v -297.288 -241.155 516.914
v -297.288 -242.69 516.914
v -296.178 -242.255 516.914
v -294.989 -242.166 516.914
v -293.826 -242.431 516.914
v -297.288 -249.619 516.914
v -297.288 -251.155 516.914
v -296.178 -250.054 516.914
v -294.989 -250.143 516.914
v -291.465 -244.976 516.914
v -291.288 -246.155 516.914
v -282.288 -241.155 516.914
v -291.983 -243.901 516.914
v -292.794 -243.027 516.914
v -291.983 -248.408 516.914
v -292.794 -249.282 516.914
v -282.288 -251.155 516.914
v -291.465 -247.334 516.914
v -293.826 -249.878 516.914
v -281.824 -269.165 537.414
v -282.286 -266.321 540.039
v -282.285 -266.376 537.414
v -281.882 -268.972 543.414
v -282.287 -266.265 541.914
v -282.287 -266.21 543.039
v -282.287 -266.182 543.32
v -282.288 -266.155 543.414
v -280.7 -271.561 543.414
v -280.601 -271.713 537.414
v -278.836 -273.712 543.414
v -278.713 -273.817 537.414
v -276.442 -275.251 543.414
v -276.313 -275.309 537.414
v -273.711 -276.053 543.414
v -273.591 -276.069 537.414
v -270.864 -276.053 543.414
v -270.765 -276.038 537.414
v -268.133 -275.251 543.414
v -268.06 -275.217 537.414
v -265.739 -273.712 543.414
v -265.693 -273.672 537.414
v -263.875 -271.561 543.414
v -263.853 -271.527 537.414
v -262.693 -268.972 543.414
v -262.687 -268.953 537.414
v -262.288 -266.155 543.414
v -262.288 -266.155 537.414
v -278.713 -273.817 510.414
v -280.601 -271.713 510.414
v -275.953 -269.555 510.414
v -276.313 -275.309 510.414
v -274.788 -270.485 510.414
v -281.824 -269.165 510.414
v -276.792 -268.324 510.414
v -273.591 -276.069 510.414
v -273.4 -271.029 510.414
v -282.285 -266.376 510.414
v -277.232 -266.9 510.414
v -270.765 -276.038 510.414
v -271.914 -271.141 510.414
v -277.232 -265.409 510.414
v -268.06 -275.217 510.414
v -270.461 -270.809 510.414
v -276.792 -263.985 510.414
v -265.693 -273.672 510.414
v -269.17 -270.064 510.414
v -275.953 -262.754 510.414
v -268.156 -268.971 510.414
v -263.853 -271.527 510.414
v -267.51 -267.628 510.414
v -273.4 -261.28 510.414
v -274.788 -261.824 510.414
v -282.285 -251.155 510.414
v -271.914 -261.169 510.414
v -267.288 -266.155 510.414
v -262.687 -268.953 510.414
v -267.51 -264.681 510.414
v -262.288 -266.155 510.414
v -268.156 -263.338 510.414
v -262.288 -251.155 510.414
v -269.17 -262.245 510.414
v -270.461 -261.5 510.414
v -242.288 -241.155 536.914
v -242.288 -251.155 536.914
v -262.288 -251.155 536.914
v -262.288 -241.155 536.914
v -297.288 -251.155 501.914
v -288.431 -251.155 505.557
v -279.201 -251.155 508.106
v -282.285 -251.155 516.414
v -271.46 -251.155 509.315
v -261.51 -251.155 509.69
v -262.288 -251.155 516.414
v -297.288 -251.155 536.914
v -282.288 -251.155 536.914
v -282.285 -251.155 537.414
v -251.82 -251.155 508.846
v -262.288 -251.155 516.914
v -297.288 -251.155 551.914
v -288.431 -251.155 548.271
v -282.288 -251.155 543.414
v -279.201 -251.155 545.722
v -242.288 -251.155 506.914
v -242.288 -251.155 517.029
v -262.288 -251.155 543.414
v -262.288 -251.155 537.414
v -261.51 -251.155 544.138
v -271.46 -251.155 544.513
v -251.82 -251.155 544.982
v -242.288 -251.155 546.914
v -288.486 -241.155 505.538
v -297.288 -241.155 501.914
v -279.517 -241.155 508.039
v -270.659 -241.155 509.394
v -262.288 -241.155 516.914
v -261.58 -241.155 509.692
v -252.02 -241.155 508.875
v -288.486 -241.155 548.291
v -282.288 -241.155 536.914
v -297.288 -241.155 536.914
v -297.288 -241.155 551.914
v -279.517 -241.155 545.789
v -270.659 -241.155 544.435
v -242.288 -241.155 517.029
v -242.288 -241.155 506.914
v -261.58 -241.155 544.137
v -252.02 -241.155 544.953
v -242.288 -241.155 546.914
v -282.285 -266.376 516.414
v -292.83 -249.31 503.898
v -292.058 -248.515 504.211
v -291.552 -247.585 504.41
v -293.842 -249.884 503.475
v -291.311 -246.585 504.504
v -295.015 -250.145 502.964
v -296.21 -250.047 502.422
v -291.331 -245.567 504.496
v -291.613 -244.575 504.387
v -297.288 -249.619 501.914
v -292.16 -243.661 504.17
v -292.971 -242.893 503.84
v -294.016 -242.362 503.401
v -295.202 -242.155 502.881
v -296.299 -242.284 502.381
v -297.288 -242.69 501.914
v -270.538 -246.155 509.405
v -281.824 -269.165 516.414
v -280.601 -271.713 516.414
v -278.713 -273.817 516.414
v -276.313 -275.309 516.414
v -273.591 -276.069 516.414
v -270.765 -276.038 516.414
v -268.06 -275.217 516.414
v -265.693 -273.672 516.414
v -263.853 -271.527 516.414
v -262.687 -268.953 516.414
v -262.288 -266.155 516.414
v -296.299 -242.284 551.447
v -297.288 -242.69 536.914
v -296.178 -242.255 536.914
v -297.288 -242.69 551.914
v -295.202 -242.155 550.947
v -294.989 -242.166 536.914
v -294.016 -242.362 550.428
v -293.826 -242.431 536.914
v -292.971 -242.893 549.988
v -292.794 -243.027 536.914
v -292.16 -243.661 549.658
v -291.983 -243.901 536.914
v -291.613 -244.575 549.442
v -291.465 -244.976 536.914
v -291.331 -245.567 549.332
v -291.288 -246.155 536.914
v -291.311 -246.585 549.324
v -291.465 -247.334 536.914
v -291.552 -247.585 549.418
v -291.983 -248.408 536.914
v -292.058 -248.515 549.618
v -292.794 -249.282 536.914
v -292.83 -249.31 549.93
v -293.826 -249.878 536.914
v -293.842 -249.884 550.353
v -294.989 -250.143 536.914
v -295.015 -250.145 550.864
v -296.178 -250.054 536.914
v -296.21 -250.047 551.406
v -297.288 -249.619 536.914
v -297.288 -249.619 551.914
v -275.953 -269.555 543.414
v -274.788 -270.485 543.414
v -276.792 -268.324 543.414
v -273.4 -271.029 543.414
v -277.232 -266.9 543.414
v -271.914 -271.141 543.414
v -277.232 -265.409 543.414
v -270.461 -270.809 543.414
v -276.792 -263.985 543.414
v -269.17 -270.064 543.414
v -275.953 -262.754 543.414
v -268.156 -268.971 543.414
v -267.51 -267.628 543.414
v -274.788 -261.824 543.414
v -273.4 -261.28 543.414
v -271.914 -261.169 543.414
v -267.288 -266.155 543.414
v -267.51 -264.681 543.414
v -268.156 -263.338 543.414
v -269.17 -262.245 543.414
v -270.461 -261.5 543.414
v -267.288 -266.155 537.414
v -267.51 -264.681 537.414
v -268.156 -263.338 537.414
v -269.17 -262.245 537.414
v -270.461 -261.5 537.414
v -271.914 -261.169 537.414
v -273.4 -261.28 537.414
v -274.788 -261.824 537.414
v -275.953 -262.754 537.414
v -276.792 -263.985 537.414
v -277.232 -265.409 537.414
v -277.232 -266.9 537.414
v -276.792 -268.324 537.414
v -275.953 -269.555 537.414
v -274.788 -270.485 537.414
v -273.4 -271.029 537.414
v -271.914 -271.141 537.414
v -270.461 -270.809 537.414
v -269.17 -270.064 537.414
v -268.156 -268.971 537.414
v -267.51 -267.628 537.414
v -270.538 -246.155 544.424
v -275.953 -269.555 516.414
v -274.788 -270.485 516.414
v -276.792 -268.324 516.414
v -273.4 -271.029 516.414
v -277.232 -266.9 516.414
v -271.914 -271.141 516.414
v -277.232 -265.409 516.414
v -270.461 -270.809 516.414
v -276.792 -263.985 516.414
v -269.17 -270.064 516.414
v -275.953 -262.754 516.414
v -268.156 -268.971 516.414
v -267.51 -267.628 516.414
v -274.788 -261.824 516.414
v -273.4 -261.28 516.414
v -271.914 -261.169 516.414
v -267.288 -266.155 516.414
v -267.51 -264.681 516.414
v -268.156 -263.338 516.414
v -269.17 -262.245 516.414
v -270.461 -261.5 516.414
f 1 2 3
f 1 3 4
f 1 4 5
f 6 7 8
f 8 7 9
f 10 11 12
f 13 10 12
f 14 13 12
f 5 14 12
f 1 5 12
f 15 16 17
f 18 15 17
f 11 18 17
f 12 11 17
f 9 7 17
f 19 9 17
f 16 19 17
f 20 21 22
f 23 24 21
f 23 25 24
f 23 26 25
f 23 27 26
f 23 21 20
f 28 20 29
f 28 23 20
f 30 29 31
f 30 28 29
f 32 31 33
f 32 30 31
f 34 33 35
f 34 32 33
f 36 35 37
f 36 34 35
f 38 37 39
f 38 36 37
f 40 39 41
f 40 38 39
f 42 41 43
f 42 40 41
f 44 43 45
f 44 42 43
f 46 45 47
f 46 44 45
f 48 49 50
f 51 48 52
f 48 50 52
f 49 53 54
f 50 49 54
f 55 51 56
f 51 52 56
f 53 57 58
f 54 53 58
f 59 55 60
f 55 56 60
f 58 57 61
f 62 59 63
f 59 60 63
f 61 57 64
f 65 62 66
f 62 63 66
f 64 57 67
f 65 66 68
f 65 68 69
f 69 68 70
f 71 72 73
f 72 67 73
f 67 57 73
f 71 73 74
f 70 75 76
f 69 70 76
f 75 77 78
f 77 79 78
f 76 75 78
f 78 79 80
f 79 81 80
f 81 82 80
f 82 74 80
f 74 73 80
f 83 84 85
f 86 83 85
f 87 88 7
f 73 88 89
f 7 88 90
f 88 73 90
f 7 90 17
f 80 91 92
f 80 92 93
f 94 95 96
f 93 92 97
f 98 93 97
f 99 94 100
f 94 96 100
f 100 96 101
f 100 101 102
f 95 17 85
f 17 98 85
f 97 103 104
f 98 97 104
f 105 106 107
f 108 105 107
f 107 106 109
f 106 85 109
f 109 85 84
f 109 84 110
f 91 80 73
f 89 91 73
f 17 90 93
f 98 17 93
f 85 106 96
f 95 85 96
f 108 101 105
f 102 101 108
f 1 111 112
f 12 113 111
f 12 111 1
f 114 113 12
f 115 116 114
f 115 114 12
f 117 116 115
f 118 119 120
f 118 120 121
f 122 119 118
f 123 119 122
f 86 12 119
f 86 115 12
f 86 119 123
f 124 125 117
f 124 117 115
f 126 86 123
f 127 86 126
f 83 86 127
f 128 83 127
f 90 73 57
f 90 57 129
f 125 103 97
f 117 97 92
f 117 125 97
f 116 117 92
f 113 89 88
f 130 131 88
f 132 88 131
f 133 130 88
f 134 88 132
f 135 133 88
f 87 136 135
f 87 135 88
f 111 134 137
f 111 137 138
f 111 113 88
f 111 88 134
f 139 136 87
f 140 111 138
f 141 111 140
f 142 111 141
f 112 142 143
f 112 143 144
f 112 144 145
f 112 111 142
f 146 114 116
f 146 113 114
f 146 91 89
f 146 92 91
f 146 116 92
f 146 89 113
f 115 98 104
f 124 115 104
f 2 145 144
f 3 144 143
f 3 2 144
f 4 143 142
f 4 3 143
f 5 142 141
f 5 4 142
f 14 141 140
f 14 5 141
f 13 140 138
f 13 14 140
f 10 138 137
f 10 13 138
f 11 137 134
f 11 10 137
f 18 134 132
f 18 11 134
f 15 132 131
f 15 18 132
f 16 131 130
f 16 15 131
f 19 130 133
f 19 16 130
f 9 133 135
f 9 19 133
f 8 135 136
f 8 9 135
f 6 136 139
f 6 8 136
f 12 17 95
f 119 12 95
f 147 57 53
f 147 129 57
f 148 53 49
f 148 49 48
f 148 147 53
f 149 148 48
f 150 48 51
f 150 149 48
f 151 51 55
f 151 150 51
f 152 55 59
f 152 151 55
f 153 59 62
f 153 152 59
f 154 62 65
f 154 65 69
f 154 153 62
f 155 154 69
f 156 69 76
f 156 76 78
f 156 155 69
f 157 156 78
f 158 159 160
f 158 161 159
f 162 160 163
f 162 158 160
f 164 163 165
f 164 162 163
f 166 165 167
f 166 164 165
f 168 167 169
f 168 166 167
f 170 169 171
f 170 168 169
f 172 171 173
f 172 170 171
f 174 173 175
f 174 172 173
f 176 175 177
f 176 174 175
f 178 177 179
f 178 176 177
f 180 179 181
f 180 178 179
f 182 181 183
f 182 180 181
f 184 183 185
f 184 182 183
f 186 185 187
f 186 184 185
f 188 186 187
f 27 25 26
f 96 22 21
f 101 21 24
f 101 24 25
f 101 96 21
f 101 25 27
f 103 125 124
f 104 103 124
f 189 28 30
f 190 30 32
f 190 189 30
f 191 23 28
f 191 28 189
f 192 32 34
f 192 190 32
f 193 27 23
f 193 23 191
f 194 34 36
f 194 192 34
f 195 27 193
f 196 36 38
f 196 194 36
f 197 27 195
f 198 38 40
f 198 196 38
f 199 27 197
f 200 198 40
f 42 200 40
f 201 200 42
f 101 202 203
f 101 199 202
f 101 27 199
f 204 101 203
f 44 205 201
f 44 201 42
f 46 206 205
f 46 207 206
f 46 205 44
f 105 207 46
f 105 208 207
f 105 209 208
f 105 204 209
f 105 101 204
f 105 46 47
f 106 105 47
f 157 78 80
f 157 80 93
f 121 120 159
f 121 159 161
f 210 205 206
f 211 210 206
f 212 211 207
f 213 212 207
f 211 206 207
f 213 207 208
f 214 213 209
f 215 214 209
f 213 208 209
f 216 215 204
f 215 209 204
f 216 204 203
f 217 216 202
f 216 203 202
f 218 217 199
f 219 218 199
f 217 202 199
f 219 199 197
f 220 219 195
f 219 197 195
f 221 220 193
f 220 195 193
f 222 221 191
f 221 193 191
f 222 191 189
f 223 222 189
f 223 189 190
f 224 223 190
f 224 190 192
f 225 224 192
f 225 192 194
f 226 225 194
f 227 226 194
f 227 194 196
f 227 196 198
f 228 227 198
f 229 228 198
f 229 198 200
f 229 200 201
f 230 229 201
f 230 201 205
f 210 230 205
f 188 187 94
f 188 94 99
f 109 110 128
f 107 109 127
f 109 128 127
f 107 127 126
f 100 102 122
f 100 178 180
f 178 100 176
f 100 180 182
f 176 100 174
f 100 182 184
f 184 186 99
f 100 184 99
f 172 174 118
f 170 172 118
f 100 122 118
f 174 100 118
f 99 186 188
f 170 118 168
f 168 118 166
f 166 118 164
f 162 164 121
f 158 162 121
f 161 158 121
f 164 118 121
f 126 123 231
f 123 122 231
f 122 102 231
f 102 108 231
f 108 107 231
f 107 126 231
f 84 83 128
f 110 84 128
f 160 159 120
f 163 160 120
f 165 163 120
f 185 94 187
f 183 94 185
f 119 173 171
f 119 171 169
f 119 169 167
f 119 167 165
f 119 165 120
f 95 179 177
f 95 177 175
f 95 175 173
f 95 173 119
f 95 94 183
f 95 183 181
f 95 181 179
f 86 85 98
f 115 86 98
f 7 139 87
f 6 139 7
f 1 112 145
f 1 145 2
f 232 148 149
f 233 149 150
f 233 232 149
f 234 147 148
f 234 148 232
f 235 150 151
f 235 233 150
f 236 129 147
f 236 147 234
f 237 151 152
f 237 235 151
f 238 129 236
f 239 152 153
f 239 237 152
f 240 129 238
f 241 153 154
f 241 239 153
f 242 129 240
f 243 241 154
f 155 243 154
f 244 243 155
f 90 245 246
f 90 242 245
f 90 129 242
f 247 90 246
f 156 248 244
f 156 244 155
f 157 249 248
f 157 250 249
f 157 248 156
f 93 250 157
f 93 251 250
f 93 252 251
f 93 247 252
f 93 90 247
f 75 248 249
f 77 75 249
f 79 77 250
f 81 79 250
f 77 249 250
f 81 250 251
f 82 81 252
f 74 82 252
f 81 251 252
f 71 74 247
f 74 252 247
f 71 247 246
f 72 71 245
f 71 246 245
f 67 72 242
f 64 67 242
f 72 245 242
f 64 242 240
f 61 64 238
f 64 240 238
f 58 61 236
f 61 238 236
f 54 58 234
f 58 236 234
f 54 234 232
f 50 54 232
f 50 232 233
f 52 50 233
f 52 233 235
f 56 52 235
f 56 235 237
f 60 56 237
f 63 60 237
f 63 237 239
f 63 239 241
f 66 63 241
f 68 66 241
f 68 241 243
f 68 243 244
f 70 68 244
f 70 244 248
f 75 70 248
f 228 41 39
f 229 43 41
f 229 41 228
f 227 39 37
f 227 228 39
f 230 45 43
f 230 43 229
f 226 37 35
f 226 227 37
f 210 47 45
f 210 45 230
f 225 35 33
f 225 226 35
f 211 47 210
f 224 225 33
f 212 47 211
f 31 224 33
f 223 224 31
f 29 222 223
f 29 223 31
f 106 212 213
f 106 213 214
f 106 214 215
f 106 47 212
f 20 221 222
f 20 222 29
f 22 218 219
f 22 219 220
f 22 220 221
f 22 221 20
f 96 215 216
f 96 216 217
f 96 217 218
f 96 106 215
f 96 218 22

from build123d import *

# Parameters (mm, degrees)
SKETCH_1_W               = 77
SKETCH_1_H               = 10
EXTRUDE_1_DEPTH          = 55
CUT_EXTRUDE_1_DEPTH      = 639.884201719
SKETCH_4_W               = 15
SKETCH_4_H               = 20
CUT_EXTRUDE_3_DEPTH      = 10
SKETCH_5_W               = 19.997544879
SKETCH_5_H               = 6
EXTRUDE_2_DEPTH          = 26
SKETCH_8_R               = 5
CUT_EXTRUDE_4_DEPTH      = 409.554479516
CUT_EXTRUDE_5_DEPTH      = 407.529462179
CUT_EXTRUDE_5_DEPTH_BACK = 407.529462179
SKETCH_10_R              = 4


with BuildPart() as part:
    # 草图1 → 凸台-拉伸1 (new body)
    with BuildSketch(Plane.ZY.offset(242.287512766)):
        with Locations((526.914147293, -246.15455511)):
            Rectangle(SKETCH_1_W, SKETCH_1_H)
    extrude(amount=EXTRUDE_1_DEPTH)

    # 草图2 → 切除-拉伸1 (cut, through all)
    with BuildSketch(Plane(origin=(0, -241.15455511, 0), x_dir=(1, 0, 0), z_dir=(0, 1, 0))):
        with BuildLine():
            Line((-242.287512766, -506.914147293), (-242.287512766, -488.414147293))
            Line((-242.287512766, -488.414147293), (-297.287512766, -488.414147293))
            Line((-297.287512766, -488.414147293), (-297.287512766, -501.914147293))
            add(Edge.make_bspline(
                [(-242.287512766, -506.914147293), (-271.288122088, -514.395388486), (-297.287512766, -501.914147293)],
                knots=[0, 0, 0, 1, 1, 1], degree=2))
        make_face()
        with BuildLine():
            Line((-242.287512766, -546.914147293), (-242.287512766, -565.414147293))
            Line((-242.287512766, -565.414147293), (-297.287512766, -565.414147293))
            Line((-297.287512766, -565.414147293), (-297.287512766, -551.914147293))
            add(Edge.make_bspline(
                [(-242.287512766, -546.914147293), (-271.288122088, -539.4329061), (-297.287512766, -551.914147293)],
                knots=[0, 0, 0, 1, 1, 1], degree=2))
        make_face()
    extrude(amount=-CUT_EXTRUDE_1_DEPTH, mode=Mode.SUBTRACT)

    # 草图4 → 切除-拉伸3 (cut)
    with BuildSketch(Plane.XZ.offset(251.15455511)):
        Polygon((-242.287512766, 517.028807482), (-242.287512766, 526.914147293), (-242.287512766, 536.914147293), (-262.287512766, 536.914147293), (-262.287512766, 516.914147293), align=None)
        with Locations((-289.787512766, 526.914147293)):
            Rectangle(SKETCH_4_W, SKETCH_4_H)
    extrude(amount=-CUT_EXTRUDE_3_DEPTH, mode=Mode.SUBTRACT)

    # 草图5 → 凸台-拉伸2 (add)
    with BuildSketch(Plane.XZ.offset(251.15455511)):
        Polygon((-262.287512766, 537.414147293), (-282.285057645, 537.414147293), (-282.287512766, 543.414147293), (-262.287512766, 543.414147293), align=None)
        with Locations((-272.286285206, 513.414147293)):
            Rectangle(SKETCH_5_W, SKETCH_5_H)
    extrude(amount=EXTRUDE_2_DEPTH)

    # 草图8 → 切除-拉伸4 (cut, through all)
    with BuildSketch(Plane.XY.offset(543.414147293)):
        with Locations((-272.287512766, -266.15455511)):
            Circle(SKETCH_8_R)
        with BuildLine():
            Line((-262.287512766, -266.15455511), (-262.287512766, -277.15455511))
            Line((-262.287512766, -277.15455511), (-282.287512766, -277.15455511))
            Line((-282.287512766, -277.15455511), (-282.287512766, -266.15455511))
            ThreePointArc((-282.287512766, -266.15455511), (-272.287512766, -276.15455511), (-262.287512766, -266.15455511))
        make_face()
    extrude(amount=-CUT_EXTRUDE_4_DEPTH, mode=Mode.SUBTRACT)

    # 草图10 → 切除-拉伸5 (cut, two sides: drawn at the far end of the back side and taken through both)
    with BuildSketch(Plane(origin=(0, 0, 526.914147293), x_dir=(-1, 0, 0), z_dir=(0, 0, -1)).offset(-CUT_EXTRUDE_5_DEPTH_BACK)):
        with Locations((295.287512766, -246.15455511)):
            Circle(SKETCH_10_R)
    extrude(amount=CUT_EXTRUDE_5_DEPTH + CUT_EXTRUDE_5_DEPTH_BACK, mode=Mode.SUBTRACT)


solid = part.part
